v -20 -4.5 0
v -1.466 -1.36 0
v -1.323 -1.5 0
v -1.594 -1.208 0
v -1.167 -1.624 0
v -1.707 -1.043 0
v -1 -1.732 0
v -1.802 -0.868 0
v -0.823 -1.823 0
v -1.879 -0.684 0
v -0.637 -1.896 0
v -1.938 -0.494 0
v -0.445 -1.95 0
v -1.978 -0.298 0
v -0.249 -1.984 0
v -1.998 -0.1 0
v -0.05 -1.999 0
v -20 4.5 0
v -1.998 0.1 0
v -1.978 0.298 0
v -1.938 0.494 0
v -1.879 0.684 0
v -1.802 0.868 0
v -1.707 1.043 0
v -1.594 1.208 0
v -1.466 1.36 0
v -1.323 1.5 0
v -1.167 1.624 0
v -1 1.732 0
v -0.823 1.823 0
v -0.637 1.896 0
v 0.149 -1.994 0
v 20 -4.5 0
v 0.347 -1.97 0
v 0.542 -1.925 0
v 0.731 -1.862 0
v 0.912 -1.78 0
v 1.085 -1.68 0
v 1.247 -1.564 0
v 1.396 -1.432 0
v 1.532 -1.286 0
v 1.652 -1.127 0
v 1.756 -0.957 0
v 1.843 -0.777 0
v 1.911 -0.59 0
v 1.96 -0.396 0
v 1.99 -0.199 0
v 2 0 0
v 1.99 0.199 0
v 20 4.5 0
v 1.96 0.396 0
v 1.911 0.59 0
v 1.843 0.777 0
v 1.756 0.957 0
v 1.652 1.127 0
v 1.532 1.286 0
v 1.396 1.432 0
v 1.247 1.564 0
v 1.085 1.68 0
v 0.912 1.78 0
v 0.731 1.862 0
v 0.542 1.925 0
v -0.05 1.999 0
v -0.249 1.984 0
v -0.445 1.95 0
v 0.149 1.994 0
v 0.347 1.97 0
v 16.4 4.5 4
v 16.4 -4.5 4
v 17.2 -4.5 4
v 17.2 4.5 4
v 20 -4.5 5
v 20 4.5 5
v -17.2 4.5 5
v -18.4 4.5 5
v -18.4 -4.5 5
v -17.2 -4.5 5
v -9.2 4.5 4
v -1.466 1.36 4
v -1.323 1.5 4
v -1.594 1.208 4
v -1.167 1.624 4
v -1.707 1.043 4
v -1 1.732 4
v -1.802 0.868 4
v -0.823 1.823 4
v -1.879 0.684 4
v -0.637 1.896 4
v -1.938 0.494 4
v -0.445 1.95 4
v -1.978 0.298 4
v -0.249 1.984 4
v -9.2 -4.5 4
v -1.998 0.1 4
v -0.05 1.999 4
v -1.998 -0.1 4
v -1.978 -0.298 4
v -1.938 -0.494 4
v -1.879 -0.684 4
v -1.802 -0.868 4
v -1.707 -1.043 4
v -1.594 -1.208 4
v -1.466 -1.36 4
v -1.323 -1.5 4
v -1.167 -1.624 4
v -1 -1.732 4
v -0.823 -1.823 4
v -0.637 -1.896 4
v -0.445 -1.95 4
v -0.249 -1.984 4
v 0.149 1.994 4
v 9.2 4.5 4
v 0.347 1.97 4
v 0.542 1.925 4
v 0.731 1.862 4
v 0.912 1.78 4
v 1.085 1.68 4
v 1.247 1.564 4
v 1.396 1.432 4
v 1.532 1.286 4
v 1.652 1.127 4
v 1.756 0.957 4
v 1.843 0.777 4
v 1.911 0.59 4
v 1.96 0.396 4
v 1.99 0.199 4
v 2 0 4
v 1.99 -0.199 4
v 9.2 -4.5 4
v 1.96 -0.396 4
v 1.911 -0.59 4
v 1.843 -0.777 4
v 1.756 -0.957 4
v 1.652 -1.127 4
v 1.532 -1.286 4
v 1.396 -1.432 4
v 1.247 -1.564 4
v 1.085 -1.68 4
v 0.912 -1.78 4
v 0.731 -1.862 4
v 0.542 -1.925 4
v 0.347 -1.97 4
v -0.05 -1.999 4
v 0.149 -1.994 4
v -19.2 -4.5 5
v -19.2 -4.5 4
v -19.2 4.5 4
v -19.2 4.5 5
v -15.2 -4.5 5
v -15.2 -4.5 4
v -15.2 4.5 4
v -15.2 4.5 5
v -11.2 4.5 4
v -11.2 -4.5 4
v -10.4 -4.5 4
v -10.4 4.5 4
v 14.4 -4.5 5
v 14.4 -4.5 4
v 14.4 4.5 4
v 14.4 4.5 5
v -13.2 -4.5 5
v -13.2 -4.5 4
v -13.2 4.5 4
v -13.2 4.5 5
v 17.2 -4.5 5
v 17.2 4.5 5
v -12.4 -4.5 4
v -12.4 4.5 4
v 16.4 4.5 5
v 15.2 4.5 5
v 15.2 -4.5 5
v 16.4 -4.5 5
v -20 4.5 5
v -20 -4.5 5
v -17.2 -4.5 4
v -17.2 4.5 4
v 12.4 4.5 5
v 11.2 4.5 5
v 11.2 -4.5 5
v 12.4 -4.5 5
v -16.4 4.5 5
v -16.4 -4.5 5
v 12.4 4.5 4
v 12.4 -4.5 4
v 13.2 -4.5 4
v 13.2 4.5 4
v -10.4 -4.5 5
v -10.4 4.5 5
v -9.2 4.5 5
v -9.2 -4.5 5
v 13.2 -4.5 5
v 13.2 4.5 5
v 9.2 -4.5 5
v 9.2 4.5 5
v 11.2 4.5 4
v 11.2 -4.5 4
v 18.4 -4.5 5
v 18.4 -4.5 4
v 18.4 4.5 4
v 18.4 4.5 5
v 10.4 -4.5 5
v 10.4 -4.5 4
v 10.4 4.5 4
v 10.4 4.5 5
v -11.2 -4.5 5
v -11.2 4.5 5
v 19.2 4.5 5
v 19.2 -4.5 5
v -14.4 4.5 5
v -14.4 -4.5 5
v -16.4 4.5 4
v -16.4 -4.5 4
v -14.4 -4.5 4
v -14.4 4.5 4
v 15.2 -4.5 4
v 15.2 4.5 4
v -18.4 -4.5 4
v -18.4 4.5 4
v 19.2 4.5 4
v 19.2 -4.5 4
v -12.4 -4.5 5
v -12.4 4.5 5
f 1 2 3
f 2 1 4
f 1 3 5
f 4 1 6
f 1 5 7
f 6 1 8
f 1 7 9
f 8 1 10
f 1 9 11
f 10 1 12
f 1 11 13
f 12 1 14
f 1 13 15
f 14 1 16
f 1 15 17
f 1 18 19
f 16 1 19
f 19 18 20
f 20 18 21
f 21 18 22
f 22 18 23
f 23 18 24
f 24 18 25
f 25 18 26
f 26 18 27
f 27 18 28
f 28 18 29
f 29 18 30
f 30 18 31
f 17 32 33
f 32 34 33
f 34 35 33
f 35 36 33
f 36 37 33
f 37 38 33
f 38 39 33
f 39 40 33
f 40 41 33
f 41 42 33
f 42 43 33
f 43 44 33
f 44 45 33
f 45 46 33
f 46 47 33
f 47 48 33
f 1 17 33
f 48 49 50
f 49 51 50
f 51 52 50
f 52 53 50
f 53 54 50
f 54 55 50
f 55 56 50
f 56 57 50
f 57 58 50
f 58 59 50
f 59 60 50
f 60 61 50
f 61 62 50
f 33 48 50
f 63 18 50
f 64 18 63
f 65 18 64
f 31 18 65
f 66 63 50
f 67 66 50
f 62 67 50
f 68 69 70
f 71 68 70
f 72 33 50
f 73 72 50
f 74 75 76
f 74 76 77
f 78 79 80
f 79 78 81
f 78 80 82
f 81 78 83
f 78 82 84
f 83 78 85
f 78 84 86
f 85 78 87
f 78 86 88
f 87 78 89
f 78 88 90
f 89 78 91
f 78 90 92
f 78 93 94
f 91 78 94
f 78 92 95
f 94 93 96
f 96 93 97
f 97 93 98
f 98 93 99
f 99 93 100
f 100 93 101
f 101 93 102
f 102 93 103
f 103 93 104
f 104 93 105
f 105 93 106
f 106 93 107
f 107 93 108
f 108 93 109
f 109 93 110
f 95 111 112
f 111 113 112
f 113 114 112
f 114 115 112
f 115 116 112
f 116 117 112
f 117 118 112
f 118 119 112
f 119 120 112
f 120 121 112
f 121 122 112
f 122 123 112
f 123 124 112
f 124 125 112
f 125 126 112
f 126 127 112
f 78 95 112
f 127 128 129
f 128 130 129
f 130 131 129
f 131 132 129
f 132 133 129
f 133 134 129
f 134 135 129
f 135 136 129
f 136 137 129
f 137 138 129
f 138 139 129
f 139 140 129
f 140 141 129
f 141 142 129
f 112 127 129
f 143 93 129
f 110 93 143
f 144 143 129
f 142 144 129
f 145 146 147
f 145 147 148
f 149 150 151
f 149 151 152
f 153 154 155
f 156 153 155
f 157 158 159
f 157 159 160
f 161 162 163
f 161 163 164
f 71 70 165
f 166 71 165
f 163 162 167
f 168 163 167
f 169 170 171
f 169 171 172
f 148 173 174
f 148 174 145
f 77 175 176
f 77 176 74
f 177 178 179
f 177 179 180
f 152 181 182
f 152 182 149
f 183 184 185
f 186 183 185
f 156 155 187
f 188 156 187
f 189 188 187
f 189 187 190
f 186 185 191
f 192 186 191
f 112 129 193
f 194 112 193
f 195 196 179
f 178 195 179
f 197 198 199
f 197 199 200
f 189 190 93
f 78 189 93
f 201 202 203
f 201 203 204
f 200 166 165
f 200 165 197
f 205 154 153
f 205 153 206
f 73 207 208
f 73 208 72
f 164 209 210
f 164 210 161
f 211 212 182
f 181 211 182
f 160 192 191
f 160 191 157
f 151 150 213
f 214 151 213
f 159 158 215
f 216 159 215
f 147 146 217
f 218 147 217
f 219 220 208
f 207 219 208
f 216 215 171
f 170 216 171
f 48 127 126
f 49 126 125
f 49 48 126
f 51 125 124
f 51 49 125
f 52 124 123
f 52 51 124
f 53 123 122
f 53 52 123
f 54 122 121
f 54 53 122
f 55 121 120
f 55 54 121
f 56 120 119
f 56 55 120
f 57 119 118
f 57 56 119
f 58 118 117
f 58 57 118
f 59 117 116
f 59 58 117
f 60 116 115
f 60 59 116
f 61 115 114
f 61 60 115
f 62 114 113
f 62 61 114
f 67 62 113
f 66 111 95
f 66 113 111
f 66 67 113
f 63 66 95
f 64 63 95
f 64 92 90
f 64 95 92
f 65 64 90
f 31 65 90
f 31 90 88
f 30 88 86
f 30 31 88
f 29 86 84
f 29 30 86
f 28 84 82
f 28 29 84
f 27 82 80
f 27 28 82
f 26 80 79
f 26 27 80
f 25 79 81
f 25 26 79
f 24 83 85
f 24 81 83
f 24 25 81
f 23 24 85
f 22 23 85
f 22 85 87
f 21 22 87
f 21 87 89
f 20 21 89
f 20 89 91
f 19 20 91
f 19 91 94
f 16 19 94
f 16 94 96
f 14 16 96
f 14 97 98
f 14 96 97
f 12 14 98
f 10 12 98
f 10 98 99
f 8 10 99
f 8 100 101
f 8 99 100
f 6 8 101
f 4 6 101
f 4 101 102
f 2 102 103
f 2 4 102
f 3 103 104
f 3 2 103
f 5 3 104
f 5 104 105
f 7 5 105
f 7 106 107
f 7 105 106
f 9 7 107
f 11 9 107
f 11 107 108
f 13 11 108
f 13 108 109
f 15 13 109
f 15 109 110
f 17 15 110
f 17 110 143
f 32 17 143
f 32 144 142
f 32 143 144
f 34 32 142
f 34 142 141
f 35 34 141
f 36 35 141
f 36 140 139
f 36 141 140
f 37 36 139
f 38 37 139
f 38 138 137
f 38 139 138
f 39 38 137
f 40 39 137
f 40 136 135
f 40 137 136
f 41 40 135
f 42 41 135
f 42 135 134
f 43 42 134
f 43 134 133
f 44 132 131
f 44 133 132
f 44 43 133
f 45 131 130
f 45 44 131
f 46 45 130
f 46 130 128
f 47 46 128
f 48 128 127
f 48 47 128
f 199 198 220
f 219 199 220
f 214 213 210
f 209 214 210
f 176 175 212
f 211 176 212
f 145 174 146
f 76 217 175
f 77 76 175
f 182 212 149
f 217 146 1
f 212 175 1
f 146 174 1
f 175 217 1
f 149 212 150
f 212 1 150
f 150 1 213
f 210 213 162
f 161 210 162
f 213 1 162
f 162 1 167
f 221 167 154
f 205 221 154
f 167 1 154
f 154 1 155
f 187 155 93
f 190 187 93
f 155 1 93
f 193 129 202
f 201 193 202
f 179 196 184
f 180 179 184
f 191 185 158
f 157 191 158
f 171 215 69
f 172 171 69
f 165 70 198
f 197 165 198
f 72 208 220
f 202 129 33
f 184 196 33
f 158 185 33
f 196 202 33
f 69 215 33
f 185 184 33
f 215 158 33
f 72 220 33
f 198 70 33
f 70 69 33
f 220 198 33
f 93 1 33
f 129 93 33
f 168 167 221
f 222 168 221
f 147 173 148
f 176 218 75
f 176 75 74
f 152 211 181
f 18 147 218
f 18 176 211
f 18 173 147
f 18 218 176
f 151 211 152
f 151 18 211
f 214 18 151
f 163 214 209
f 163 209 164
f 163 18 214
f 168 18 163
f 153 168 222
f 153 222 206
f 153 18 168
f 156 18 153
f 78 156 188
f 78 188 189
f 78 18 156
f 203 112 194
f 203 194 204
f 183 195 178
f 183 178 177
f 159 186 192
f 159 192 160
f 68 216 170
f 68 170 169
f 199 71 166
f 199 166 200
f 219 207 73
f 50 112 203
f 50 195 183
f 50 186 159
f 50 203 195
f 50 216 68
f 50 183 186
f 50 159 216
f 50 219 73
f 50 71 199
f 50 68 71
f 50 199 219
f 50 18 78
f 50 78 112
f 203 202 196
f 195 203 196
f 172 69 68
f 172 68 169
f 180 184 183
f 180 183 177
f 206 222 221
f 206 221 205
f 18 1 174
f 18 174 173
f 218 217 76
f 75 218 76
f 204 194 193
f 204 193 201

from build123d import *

# Parameters (mm, degrees)
SKETCH_1_W          = 40
SKETCH_1_H          = 9
SKETCH_1_R          = 2
EXTRUDE_1_DEPTH     = 5
SKETCH_2_W          = 0.8
SKETCH_2_H          = 1
CUT_EXTRUDE_1_DEPTH = 23.494443758


with BuildPart() as part:
    # 草圖1 → 填料-伸長1 (new body)
    with BuildSketch(Plane.XY):
        Rectangle(SKETCH_1_W, SKETCH_1_H)
        Circle(SKETCH_1_R, mode=Mode.SUBTRACT)
    extrude(amount=EXTRUDE_1_DEPTH)

    # 草圖2 → 除料-伸長1 (cut, through all)
    with BuildSketch(Plane.XZ.offset(4.5)):
        with Locations((-18.8, 4.5)):
            Rectangle(SKETCH_2_W, SKETCH_2_H)
        with Locations((-16.8, 4.5)):
            Rectangle(SKETCH_2_W, SKETCH_2_H)
        with Locations((-14.8, 4.5)):
            Rectangle(SKETCH_2_W, SKETCH_2_H)
        with Locations((-12.8, 4.5)):
            Rectangle(SKETCH_2_W, SKETCH_2_H)
        with Locations((-10.8, 4.5)):
            Rectangle(SKETCH_2_W, SKETCH_2_H)
        Polygon((-9.2, 4), (-8.4, 4), (8.4, 4), (9.2, 4), (9.2, 5), (8.4, 5), (-8.4, 5), (-9.2, 5), align=None)
        with Locations((10.8, 4.5)):
            Rectangle(SKETCH_2_W, SKETCH_2_H)
        with Locations((12.8, 4.5)):
            Rectangle(SKETCH_2_W, SKETCH_2_H)
        with Locations((14.8, 4.5)):
            Rectangle(SKETCH_2_W, SKETCH_2_H)
        with Locations((16.8, 4.5)):
            Rectangle(SKETCH_2_W, SKETCH_2_H)
        with Locations((18.8, 4.5)):
            Rectangle(SKETCH_2_W, SKETCH_2_H)
    extrude(amount=-CUT_EXTRUDE_1_DEPTH, mode=Mode.SUBTRACT)


solid = part.part
